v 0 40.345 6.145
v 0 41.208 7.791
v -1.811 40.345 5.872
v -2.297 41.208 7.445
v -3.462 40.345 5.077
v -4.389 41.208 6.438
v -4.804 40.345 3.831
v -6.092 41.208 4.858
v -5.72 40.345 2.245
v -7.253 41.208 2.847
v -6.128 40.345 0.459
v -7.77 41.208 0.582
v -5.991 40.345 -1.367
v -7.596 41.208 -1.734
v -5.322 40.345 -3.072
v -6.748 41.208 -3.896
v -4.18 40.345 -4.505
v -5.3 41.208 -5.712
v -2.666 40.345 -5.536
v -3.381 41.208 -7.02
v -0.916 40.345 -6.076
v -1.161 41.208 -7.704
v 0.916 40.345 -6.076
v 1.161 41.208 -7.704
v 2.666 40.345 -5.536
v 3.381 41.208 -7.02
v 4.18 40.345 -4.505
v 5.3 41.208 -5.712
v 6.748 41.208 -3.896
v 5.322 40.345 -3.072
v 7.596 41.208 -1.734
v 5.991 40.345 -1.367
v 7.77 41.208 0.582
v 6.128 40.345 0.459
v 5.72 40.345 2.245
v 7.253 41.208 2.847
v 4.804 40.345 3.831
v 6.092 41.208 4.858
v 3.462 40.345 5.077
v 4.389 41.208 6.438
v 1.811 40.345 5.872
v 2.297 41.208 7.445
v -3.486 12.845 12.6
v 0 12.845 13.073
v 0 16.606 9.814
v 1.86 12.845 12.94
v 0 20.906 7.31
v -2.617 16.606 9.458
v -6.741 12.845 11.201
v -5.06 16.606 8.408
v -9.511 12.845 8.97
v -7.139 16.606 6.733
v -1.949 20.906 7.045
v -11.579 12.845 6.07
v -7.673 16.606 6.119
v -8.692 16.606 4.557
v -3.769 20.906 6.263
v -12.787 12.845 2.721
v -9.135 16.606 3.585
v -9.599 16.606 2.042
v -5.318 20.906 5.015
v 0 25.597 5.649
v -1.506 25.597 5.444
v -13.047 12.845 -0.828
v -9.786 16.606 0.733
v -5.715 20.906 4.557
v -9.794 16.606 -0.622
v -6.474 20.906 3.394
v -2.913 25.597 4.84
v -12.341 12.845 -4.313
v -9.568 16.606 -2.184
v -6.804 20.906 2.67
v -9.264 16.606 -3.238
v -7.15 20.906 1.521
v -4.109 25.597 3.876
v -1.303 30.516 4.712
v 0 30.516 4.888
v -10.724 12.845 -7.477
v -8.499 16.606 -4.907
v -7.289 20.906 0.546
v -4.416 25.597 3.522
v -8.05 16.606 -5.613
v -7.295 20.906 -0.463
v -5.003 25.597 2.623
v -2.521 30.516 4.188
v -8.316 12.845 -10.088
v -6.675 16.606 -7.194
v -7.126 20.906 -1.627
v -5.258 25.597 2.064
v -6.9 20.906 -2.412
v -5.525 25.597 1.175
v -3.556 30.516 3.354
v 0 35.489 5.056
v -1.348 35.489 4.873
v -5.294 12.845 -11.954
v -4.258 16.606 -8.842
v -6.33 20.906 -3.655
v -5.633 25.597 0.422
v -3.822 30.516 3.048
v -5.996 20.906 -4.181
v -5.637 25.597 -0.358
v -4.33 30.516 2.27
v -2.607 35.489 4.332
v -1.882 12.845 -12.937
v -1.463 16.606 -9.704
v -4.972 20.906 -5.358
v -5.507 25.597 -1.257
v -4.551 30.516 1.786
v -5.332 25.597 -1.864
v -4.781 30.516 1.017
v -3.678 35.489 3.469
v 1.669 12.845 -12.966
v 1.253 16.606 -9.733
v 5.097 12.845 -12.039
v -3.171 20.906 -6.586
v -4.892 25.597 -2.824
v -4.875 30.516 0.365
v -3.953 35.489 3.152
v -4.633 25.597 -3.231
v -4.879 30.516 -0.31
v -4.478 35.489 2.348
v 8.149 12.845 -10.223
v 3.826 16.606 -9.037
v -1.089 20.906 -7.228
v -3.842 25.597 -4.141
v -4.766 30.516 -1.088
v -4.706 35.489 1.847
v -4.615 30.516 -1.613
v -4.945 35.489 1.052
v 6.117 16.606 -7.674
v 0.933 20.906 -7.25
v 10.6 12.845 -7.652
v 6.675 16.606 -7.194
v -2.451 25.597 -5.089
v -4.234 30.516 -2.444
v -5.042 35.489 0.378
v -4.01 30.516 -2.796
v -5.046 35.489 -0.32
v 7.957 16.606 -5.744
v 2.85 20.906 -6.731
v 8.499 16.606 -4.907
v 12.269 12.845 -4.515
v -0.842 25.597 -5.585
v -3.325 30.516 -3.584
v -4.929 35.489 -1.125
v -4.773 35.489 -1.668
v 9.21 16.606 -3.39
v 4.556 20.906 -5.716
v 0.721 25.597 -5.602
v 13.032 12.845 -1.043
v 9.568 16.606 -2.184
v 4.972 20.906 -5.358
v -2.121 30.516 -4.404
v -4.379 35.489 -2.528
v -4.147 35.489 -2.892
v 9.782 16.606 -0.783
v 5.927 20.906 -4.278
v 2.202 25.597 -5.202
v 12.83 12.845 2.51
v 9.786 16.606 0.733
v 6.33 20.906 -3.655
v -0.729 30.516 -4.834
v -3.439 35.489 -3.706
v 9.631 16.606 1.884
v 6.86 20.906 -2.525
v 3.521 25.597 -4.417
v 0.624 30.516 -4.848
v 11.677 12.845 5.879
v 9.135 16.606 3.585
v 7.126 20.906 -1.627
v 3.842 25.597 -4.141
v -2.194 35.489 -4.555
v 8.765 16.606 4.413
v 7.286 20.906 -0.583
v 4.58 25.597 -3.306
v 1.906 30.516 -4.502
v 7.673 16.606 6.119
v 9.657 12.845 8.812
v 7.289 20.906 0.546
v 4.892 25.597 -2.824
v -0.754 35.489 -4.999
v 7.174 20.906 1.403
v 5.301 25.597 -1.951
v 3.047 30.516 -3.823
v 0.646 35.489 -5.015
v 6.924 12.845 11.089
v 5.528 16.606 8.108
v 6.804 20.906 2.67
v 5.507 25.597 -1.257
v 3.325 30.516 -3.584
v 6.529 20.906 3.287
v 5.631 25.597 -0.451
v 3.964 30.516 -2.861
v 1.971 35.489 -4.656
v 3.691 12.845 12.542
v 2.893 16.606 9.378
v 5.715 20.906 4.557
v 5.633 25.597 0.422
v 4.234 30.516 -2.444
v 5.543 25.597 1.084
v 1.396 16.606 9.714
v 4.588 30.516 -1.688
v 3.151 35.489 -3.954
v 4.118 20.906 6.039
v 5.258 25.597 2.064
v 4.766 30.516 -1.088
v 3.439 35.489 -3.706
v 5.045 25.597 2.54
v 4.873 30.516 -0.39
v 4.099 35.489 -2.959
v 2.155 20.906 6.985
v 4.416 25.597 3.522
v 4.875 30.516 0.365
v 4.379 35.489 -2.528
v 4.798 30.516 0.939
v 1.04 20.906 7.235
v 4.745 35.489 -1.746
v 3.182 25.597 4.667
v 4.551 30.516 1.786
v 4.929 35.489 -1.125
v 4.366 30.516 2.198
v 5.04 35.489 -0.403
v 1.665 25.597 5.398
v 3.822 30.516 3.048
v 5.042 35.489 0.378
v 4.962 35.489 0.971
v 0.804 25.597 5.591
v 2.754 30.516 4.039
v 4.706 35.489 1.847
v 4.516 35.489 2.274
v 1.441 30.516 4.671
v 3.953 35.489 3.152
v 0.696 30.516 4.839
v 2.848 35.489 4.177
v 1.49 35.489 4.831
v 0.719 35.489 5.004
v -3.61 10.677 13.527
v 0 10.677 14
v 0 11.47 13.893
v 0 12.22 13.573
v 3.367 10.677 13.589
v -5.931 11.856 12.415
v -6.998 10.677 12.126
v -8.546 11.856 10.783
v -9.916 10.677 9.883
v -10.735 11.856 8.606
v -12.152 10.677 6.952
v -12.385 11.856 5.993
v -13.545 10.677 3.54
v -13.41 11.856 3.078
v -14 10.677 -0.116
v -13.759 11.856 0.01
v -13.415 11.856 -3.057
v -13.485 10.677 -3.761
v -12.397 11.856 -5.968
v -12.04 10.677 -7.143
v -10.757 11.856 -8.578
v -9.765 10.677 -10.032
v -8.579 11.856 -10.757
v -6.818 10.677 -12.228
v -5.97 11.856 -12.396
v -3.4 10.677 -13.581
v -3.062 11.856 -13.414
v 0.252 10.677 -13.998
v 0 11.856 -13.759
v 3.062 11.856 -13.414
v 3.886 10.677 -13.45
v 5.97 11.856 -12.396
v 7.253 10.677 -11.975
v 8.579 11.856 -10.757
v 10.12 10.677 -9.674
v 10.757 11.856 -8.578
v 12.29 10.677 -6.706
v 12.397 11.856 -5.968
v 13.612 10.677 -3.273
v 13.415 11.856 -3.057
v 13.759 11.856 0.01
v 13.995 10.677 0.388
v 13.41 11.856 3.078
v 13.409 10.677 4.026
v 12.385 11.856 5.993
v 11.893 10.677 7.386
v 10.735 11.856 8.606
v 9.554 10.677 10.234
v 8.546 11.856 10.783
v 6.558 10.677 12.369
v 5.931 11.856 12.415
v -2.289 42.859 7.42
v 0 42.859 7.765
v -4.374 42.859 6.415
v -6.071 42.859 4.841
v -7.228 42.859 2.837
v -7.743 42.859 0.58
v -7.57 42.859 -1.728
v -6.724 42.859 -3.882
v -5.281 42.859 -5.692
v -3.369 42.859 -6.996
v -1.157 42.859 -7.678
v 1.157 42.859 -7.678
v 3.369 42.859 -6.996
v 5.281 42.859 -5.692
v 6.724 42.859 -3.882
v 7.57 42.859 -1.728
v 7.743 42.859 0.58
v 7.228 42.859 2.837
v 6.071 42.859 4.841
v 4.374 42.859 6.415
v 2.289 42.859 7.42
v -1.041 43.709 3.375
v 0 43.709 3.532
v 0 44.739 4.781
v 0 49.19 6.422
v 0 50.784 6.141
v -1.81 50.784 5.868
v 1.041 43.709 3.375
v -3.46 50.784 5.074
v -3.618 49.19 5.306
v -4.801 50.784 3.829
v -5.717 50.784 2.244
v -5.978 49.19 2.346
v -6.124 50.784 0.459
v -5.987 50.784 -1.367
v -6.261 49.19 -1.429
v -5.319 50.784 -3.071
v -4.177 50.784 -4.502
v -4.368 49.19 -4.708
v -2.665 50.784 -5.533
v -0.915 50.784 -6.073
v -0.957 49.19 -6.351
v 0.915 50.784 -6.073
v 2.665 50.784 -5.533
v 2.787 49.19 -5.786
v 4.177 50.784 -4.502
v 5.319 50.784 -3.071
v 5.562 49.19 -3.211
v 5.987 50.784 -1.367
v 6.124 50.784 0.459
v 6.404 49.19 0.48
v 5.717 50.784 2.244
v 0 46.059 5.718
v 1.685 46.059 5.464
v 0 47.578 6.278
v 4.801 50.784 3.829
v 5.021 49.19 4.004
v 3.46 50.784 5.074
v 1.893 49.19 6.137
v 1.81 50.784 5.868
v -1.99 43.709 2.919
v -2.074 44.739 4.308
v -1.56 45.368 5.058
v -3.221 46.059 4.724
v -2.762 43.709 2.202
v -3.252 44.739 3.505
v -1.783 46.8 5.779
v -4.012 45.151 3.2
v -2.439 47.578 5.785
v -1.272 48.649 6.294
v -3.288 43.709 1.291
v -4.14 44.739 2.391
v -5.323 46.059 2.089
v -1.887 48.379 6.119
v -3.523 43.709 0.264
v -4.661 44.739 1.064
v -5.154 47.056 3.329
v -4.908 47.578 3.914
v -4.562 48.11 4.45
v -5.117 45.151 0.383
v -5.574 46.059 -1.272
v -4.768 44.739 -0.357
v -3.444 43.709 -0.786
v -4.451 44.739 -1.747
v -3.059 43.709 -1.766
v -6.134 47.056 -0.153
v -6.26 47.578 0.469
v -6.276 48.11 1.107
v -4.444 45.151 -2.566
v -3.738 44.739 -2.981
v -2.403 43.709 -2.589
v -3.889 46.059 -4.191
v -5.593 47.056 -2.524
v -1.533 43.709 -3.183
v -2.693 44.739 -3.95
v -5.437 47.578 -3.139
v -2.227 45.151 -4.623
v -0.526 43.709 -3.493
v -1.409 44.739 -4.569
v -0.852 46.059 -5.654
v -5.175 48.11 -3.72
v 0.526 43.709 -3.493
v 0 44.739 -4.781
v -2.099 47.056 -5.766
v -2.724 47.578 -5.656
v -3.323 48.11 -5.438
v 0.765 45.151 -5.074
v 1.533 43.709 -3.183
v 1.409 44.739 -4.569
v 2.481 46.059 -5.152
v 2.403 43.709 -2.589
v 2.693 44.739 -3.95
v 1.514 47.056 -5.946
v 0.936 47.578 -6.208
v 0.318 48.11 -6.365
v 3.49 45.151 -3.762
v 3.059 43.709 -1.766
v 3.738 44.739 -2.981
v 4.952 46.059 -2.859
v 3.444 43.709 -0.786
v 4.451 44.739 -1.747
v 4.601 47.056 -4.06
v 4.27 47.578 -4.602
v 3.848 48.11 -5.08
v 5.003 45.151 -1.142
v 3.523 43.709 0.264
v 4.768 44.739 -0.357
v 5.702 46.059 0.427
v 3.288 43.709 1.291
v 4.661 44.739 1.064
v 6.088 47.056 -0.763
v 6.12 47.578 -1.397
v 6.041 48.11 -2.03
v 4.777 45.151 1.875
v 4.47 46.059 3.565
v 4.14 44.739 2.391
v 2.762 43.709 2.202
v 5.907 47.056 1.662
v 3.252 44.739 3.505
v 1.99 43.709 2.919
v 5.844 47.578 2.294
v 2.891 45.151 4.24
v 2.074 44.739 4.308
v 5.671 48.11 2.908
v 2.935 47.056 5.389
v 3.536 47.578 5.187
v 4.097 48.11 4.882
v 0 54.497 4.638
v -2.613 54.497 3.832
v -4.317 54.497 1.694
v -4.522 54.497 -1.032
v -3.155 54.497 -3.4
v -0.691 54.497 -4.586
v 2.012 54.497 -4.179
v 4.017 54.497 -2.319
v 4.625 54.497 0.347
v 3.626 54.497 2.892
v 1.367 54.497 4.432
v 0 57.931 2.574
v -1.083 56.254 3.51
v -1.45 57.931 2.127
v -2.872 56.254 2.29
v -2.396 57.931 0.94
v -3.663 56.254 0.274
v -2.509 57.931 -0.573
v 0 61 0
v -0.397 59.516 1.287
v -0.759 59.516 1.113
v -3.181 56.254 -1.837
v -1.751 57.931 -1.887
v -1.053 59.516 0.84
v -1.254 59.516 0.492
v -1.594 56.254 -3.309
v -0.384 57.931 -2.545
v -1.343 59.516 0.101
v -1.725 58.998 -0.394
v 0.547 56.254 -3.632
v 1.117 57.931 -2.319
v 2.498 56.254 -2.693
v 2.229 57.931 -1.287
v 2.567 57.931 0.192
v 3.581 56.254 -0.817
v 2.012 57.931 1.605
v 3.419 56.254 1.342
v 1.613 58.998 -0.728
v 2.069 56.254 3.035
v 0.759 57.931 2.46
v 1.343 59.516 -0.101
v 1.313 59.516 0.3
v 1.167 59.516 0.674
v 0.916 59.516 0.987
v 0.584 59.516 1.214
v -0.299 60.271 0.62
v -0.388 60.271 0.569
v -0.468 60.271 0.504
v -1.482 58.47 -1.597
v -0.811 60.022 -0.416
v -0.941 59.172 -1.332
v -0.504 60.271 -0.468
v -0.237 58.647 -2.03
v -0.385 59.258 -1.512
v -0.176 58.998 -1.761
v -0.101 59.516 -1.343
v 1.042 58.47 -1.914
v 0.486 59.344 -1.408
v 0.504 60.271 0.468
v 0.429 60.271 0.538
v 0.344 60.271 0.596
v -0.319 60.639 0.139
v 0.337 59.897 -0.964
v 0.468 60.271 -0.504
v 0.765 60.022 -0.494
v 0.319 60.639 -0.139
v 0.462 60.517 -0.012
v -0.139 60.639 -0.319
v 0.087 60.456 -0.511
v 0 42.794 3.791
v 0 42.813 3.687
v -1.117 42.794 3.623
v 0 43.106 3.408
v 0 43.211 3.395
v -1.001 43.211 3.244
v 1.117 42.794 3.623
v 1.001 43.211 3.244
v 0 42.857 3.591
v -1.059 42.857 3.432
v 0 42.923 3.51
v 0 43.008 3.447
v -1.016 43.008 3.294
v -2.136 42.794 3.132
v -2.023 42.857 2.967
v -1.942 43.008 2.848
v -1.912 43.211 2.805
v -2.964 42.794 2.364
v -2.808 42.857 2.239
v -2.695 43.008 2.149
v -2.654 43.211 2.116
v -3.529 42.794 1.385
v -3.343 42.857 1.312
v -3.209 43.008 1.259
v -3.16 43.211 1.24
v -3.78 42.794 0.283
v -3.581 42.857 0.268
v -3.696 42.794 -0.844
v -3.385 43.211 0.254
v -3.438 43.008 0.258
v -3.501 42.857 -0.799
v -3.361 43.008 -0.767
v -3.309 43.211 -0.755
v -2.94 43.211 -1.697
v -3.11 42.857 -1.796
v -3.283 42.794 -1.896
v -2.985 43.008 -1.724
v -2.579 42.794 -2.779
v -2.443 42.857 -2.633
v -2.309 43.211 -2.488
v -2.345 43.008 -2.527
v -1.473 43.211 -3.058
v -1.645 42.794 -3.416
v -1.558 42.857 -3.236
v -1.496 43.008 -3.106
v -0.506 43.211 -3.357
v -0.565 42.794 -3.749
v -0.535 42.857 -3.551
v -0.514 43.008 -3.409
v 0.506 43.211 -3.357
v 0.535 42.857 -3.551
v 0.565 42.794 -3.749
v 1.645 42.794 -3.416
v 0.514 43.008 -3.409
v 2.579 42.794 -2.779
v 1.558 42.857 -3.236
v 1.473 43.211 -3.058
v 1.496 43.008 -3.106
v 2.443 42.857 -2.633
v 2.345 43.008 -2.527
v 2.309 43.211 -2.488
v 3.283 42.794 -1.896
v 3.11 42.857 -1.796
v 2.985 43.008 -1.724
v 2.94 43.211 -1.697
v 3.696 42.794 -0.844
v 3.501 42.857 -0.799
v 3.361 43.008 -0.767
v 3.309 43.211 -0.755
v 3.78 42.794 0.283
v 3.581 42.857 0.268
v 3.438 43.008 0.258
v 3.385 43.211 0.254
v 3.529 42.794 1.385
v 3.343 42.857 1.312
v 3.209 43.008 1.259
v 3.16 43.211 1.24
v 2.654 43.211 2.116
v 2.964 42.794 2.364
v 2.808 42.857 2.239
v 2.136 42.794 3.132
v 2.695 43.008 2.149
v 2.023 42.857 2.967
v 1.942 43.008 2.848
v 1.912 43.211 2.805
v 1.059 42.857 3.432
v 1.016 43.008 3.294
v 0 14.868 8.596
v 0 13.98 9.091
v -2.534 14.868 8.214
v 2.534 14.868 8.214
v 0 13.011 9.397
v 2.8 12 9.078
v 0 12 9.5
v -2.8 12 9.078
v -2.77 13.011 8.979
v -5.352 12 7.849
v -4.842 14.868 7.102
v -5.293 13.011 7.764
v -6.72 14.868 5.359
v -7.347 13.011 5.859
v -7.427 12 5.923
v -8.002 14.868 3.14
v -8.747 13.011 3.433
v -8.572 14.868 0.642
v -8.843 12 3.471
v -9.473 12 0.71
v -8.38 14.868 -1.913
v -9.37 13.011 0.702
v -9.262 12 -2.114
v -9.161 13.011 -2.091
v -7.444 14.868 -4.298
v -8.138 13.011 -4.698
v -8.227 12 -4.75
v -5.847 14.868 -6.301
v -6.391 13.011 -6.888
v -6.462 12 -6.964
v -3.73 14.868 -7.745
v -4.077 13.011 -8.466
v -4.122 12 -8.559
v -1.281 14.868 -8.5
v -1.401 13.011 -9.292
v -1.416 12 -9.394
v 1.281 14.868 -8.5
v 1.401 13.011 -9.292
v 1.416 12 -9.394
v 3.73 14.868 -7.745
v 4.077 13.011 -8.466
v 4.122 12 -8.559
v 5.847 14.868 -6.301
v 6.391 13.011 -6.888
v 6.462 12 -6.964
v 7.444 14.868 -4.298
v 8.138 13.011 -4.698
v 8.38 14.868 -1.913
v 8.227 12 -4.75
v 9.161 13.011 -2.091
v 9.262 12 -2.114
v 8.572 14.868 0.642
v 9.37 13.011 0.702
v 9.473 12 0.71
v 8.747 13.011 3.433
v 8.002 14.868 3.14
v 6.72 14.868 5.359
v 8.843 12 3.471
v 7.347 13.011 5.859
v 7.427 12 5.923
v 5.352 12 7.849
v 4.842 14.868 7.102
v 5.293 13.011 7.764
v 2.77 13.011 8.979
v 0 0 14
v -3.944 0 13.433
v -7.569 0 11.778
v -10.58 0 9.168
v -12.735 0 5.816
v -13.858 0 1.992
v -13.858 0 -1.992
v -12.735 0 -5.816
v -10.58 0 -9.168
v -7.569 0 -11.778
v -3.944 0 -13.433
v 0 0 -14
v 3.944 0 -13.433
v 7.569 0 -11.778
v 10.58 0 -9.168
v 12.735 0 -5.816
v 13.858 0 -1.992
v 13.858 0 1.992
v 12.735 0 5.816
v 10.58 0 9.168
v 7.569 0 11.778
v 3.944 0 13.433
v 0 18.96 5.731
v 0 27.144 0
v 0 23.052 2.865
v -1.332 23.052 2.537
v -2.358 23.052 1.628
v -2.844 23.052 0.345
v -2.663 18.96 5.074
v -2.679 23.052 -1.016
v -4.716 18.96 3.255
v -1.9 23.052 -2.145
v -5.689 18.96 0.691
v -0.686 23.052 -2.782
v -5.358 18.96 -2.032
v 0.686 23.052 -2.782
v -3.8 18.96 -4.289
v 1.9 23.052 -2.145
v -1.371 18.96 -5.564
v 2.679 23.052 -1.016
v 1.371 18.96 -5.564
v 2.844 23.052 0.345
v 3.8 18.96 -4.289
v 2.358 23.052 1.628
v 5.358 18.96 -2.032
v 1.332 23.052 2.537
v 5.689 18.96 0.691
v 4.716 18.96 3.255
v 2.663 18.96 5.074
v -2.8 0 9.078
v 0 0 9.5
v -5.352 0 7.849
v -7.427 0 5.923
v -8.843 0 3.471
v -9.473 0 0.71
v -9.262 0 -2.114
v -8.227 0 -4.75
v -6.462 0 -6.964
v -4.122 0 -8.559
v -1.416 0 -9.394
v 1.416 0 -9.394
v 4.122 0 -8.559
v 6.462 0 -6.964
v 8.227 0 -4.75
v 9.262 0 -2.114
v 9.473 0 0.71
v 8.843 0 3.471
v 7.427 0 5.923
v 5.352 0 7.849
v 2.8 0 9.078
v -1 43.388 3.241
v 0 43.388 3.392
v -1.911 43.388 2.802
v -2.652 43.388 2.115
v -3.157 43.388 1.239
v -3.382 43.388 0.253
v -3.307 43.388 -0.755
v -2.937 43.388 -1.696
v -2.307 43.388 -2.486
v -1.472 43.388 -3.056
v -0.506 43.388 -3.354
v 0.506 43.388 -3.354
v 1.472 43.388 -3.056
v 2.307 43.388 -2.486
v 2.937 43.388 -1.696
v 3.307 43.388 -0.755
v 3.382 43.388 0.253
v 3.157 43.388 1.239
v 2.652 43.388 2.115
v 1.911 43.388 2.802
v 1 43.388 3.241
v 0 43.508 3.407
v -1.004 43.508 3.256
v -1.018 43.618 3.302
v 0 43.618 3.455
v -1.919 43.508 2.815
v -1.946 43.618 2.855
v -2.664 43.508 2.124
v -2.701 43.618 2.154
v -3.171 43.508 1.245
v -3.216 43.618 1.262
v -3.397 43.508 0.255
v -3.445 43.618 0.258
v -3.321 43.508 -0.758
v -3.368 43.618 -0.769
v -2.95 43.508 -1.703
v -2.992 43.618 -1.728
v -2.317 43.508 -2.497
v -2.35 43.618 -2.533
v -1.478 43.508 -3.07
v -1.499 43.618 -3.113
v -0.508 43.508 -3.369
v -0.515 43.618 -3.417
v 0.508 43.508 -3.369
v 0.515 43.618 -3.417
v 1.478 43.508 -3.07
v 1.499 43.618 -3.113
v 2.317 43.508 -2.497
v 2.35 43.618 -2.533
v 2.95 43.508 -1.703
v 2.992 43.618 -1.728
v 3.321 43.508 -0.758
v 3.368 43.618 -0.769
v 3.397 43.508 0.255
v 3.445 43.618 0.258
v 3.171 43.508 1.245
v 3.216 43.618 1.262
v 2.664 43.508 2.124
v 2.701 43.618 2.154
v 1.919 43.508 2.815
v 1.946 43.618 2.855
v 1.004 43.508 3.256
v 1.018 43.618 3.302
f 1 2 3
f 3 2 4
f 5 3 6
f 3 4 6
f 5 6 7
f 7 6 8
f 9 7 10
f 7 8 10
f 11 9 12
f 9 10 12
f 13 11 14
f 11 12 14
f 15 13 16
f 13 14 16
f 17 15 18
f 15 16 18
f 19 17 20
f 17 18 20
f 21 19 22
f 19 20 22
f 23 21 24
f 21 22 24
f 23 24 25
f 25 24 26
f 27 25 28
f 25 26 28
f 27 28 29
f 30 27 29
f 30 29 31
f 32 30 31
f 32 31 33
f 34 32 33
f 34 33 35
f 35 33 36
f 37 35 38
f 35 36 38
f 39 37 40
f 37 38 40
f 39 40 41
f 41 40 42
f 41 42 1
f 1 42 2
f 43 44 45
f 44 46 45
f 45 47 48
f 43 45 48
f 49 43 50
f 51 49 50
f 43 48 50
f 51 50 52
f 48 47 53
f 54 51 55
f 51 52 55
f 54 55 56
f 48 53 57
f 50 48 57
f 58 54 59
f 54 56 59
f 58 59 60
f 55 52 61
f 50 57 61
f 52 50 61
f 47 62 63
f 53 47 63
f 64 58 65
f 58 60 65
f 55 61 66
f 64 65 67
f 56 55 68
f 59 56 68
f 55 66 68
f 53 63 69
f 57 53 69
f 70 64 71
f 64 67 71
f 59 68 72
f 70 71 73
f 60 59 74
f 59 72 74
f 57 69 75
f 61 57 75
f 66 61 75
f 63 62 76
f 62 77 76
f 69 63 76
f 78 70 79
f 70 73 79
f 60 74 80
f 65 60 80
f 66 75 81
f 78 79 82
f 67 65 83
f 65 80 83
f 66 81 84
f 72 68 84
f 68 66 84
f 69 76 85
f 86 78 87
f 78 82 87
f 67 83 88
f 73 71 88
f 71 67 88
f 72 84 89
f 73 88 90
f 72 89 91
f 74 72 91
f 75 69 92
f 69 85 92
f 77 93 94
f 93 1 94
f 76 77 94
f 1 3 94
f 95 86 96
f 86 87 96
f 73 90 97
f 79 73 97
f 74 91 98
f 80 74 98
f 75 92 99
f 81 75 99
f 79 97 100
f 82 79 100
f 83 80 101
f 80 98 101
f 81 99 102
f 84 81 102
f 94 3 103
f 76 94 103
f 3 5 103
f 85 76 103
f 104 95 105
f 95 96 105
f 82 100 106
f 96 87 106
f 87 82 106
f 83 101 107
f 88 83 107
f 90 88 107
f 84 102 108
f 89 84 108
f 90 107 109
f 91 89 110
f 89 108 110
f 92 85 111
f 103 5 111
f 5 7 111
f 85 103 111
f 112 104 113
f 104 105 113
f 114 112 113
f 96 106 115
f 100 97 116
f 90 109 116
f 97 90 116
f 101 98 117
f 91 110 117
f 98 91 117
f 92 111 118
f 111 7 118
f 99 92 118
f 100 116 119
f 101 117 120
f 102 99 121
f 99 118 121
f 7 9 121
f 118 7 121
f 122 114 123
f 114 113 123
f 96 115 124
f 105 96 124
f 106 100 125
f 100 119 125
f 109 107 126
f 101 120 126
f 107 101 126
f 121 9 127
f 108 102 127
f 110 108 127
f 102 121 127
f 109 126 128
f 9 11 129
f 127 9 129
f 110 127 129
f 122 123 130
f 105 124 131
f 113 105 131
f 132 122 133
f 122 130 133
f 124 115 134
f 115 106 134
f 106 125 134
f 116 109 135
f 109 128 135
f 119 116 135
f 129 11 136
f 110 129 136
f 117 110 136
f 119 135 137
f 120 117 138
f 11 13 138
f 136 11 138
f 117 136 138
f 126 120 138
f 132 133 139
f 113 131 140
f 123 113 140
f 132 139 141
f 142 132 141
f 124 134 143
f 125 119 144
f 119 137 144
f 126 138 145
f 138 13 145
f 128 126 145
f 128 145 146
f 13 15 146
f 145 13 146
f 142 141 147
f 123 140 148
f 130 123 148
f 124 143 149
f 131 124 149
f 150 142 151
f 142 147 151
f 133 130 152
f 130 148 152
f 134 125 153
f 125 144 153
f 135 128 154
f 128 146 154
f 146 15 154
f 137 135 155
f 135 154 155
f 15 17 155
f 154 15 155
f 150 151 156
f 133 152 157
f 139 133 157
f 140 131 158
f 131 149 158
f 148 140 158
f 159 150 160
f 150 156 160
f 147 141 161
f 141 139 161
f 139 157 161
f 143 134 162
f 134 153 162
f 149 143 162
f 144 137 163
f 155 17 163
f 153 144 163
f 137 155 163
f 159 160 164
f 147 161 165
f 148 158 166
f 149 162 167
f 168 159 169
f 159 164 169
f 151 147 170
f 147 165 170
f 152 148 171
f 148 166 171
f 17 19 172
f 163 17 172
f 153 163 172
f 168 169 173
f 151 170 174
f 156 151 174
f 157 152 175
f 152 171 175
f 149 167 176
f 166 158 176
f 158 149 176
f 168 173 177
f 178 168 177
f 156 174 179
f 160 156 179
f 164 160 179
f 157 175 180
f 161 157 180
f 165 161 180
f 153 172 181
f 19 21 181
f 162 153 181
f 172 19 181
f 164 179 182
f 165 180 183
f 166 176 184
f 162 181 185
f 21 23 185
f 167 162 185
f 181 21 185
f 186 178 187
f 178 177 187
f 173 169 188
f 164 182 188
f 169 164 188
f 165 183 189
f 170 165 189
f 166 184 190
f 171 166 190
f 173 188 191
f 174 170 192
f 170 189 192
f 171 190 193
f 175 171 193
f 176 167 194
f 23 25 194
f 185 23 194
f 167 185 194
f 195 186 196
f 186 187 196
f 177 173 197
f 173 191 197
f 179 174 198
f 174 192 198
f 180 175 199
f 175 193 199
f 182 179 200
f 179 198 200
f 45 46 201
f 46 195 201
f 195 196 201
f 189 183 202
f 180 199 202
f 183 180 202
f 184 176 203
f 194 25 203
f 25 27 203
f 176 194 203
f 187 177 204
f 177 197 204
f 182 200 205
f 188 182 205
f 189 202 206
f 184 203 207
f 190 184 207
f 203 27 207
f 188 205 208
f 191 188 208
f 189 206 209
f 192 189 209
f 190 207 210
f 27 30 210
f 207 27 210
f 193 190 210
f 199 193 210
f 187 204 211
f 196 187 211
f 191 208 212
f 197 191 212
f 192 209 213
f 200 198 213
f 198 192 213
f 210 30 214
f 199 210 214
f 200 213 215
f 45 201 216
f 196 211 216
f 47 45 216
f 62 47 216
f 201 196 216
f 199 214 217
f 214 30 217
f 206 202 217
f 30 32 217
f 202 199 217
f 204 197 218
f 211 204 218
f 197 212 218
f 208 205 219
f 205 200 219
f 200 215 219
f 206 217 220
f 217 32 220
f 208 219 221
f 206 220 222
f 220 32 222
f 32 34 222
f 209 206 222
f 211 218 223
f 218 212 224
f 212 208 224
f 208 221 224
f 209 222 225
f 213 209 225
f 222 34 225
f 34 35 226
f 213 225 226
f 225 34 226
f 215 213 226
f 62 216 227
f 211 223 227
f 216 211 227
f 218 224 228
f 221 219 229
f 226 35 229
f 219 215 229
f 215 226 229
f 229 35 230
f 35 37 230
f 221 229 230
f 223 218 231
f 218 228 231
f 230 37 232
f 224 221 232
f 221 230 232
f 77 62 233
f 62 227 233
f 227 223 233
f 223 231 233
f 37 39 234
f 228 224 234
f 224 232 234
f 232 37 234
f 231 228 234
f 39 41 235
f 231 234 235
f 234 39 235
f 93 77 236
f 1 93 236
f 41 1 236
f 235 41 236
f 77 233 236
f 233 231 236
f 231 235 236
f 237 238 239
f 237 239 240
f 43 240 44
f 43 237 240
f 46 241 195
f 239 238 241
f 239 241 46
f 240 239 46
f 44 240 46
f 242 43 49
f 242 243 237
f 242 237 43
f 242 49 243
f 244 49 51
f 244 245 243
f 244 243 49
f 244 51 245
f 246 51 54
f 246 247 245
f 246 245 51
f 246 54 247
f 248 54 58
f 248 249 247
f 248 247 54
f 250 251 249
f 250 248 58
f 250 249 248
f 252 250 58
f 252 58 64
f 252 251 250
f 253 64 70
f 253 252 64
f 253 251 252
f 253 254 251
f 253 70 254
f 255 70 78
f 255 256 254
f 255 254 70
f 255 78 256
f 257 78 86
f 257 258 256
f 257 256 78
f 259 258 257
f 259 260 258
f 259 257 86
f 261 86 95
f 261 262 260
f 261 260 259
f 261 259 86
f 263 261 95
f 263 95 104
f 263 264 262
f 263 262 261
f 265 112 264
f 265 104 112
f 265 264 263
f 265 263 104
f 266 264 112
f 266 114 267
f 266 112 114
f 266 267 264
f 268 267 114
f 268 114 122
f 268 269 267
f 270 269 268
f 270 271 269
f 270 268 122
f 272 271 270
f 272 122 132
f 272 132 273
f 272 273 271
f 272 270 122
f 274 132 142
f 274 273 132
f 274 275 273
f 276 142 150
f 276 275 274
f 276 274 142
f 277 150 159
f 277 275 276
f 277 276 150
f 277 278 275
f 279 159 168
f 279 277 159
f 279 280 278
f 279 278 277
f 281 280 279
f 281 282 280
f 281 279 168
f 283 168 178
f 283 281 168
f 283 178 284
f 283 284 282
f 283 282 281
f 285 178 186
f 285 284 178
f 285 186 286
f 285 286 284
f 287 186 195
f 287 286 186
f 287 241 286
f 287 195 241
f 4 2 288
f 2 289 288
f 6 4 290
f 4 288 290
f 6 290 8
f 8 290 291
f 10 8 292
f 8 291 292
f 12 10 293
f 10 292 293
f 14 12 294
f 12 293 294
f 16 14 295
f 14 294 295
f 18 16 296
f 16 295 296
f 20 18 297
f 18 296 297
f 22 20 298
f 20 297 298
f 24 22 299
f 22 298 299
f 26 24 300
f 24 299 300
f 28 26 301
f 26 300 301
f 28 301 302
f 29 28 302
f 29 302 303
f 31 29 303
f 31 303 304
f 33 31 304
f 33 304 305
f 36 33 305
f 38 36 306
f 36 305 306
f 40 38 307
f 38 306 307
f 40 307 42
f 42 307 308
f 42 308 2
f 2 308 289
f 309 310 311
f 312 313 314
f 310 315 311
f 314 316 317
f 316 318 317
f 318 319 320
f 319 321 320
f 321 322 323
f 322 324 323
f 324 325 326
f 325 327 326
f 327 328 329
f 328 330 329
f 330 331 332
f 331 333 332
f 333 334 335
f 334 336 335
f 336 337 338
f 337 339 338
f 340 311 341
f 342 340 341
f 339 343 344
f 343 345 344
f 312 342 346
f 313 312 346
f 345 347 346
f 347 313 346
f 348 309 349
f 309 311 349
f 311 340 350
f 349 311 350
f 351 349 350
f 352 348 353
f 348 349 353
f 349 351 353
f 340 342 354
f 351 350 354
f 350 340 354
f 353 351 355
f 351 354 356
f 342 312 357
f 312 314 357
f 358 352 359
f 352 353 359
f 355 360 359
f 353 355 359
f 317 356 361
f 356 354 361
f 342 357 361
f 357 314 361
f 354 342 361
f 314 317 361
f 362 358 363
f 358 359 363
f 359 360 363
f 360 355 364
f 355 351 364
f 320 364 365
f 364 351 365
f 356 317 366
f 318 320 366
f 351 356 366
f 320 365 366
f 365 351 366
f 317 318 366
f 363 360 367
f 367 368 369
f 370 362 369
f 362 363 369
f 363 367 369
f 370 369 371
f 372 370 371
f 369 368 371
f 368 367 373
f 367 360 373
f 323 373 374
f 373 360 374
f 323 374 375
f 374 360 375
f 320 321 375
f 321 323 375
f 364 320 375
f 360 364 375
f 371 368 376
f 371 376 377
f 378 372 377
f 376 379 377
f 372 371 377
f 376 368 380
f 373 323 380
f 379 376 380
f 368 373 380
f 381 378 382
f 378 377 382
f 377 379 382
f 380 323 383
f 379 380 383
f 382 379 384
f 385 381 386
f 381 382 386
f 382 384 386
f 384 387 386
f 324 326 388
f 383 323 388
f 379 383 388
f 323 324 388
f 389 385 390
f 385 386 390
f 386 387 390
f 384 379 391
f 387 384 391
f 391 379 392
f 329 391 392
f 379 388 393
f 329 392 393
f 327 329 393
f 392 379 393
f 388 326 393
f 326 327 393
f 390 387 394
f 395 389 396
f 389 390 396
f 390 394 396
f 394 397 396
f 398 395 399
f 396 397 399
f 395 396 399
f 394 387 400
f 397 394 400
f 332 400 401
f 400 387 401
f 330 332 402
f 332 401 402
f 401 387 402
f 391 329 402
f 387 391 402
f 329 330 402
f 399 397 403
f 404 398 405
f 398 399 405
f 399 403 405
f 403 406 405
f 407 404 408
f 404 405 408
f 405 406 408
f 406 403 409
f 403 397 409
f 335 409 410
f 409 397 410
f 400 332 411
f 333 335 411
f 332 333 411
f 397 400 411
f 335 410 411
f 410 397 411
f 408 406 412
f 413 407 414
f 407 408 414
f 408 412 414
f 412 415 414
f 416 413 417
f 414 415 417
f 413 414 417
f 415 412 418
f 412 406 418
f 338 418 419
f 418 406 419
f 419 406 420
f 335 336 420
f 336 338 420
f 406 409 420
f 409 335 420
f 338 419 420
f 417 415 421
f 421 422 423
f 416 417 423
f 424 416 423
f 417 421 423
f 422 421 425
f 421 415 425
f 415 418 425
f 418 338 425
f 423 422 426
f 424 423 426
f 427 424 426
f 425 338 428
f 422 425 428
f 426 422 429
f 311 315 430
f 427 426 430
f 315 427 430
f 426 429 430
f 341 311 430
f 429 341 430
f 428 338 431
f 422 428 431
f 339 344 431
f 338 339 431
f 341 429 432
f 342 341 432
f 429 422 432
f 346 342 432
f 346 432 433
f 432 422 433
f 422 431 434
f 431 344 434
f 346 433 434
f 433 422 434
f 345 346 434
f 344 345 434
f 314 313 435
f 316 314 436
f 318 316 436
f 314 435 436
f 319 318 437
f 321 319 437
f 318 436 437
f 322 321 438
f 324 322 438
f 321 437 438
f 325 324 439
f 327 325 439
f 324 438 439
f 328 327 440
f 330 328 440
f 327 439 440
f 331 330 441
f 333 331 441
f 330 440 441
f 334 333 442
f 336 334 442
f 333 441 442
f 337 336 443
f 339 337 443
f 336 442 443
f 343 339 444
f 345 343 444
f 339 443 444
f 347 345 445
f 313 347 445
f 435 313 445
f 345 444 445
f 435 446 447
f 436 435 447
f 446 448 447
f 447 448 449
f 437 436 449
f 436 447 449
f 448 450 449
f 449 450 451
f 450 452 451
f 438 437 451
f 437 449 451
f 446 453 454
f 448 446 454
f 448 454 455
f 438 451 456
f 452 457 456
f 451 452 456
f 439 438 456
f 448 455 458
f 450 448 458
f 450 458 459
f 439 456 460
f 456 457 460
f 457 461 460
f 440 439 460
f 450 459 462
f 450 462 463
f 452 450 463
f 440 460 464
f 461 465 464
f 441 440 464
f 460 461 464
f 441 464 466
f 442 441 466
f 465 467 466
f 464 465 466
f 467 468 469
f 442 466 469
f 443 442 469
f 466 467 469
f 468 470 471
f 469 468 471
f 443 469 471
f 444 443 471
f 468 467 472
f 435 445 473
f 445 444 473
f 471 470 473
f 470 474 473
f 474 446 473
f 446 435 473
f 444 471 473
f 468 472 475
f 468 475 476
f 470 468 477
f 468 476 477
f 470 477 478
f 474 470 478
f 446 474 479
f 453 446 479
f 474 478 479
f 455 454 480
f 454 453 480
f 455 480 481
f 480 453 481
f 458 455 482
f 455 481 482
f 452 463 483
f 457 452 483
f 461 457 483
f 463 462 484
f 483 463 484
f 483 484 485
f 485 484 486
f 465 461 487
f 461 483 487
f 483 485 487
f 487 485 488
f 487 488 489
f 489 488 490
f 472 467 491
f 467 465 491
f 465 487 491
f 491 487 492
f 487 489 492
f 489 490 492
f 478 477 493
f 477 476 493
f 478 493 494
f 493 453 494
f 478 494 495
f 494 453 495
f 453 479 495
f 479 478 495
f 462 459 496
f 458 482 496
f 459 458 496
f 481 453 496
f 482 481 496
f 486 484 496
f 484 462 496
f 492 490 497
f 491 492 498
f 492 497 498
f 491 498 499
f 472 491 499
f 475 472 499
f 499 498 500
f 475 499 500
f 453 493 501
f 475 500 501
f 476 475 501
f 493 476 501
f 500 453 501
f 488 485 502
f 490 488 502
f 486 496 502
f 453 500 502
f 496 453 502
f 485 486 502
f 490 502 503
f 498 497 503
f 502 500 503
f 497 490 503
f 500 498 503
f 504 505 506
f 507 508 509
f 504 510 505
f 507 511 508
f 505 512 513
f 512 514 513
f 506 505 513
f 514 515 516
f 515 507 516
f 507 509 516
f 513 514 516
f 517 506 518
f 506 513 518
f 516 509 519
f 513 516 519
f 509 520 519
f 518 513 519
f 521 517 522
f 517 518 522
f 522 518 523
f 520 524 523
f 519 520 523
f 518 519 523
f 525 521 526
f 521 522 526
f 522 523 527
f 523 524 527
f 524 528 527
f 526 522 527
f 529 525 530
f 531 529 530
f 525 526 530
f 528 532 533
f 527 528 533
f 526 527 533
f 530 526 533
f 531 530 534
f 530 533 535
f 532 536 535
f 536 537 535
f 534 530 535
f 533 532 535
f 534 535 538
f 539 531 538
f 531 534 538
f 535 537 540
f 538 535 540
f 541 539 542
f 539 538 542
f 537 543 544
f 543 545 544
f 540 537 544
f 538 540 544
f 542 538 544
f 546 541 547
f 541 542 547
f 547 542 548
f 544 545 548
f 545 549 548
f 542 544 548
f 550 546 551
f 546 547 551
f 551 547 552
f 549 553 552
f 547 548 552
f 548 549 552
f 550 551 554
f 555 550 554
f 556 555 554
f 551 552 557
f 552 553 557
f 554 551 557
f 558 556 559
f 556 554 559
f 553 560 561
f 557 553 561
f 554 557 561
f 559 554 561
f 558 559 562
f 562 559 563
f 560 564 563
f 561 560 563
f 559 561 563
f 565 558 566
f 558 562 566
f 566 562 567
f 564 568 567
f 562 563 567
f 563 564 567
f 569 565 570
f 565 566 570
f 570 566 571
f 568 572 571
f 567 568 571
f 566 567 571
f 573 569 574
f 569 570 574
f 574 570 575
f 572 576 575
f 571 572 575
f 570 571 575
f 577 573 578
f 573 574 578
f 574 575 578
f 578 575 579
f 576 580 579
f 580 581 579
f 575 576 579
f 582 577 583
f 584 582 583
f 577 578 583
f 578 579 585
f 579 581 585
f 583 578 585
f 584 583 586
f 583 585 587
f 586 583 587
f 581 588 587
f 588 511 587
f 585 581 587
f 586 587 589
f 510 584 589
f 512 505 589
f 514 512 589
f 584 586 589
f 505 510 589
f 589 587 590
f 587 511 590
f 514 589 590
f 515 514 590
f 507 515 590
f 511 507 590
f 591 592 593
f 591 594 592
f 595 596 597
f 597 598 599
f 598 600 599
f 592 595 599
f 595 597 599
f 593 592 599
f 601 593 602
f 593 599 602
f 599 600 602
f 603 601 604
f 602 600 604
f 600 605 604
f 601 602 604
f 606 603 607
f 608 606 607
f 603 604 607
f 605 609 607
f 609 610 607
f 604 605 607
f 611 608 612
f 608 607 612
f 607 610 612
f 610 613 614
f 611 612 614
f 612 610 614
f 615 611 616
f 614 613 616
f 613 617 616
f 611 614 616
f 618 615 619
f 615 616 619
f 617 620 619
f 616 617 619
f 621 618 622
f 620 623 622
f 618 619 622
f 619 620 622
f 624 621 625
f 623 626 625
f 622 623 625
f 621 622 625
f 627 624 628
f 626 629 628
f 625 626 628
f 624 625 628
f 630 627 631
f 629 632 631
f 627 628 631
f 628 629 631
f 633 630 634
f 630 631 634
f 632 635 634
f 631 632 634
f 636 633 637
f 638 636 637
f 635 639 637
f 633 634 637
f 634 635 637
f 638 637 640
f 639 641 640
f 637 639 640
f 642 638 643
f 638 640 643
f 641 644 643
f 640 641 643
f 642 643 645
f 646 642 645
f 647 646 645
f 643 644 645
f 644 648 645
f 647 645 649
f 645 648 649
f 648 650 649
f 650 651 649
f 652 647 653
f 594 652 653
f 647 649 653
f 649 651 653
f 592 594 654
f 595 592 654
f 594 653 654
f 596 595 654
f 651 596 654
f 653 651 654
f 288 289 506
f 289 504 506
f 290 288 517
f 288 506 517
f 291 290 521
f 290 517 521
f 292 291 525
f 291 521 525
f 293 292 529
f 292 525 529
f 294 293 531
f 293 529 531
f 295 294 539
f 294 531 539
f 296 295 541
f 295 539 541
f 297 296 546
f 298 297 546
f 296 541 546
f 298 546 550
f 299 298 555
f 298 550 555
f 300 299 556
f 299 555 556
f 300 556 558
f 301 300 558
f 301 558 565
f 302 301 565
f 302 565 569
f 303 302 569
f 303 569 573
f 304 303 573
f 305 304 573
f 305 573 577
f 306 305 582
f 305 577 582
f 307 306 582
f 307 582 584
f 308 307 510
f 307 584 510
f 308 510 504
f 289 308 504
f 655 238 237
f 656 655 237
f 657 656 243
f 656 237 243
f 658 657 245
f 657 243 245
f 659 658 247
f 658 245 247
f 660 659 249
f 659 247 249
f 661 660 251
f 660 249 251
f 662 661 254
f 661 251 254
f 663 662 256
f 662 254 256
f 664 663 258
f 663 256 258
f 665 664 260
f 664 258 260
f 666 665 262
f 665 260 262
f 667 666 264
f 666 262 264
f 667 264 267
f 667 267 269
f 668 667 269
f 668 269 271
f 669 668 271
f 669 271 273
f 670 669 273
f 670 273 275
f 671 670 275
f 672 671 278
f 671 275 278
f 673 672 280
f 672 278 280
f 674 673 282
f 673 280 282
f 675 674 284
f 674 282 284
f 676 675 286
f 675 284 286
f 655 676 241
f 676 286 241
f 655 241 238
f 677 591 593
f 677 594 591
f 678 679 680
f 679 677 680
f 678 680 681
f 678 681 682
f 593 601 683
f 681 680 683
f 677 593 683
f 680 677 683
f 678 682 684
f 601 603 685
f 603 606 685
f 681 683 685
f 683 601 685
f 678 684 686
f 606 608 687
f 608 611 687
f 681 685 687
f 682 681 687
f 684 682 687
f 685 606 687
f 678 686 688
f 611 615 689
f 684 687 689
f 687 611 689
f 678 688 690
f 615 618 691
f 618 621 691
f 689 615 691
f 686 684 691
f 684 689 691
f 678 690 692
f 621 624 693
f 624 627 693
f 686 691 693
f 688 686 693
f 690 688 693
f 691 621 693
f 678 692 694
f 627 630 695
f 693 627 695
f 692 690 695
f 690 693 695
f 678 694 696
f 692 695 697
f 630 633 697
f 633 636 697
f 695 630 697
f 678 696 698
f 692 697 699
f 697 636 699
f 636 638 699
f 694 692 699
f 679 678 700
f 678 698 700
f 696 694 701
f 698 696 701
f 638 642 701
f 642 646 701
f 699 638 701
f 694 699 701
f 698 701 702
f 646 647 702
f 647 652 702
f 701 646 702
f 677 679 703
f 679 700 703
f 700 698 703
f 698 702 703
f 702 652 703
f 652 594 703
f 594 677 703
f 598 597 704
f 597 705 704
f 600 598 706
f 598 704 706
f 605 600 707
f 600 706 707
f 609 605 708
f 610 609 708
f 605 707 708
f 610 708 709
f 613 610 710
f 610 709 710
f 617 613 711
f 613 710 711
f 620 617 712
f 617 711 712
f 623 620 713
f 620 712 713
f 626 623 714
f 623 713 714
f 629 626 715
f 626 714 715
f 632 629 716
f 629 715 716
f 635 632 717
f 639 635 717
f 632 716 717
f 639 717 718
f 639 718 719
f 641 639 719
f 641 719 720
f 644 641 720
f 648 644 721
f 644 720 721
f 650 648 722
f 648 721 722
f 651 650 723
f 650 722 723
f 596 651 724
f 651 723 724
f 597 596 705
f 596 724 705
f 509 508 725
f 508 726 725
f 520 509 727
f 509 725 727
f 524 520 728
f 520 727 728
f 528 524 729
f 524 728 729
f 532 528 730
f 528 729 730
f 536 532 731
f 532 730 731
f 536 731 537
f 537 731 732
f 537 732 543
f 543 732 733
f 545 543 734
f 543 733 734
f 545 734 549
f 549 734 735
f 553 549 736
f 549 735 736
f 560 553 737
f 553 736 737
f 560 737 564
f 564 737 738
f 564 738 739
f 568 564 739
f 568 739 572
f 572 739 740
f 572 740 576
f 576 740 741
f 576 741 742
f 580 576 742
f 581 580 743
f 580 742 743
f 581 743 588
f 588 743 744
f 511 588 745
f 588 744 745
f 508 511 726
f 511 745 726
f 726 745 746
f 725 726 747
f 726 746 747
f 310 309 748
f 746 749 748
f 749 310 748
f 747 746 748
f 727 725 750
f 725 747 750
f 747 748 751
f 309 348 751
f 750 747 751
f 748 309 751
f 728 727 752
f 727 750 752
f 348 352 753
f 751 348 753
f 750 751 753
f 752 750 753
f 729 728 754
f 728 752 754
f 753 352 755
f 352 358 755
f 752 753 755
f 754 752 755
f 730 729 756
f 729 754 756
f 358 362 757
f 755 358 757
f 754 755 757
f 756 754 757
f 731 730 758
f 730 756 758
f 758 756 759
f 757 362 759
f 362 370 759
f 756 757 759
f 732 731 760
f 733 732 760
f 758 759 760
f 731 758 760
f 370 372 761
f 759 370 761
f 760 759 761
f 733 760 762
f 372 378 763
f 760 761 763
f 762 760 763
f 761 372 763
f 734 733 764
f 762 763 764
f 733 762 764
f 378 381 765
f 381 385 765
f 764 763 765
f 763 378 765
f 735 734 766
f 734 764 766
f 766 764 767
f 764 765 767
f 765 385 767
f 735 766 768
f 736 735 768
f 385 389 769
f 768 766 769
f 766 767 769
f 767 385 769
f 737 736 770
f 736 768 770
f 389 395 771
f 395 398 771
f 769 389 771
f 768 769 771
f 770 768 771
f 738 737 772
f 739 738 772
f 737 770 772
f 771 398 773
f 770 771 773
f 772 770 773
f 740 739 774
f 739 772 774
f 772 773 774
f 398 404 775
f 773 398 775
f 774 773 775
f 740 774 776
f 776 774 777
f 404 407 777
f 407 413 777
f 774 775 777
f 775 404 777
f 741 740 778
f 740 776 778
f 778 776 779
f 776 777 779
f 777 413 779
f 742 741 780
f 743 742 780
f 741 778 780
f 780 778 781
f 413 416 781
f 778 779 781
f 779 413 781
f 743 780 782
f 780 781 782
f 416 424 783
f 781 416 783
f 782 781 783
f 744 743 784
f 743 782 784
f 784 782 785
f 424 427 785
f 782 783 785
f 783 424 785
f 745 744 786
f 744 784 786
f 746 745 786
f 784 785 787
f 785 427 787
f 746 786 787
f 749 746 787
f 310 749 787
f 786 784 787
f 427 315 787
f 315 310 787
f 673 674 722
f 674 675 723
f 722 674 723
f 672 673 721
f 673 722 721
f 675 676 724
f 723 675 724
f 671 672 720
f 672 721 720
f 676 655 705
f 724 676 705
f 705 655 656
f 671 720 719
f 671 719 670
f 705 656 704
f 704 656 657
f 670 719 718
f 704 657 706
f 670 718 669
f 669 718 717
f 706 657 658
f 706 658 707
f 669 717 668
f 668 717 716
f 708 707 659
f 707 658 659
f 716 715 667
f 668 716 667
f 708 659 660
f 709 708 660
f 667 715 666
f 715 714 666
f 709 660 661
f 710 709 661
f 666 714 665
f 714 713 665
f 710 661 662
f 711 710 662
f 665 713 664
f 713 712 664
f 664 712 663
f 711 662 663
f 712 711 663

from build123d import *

# Parameters (mm, degrees)
FILLET1_R = 3


with BuildPart() as part:
    # Sketch1 → Revolve1 (revolve)
    with BuildSketch(Plane.XY, mode=Mode.PRIVATE) as revolve1_sk:
        with BuildLine():
            Line((9.5, 12), (9.5, 0))
            Line((9.5, 0), (14, 0))
            Line((14, 0), (14, 12))
            ThreePointArc((14, 12), (5.808899363, 24.991123715), (6.144902799, 40.3452934))
            Line((6.144902799, 40.3452934), (7.791407098, 41.20778213))
            Line((7.791407098, 41.20778213), (7.764668615, 42.858630405))
            Line((7.764668615, 42.858630405), (3.791041614, 42.794270306))
            ThreePointArc((3.791041614, 42.794270306), (3.509684474, 42.923205602), (3.394593546, 43.210503755))
            Line((3.394593546, 43.210503755), (3.39171112, 43.388466278))
            ThreePointArc((3.39171112, 43.388466278), (3.427062825, 43.564311584), (3.532381916, 43.709498374))
            ThreePointArc((3.532381916, 43.709498374), (6.047939548, 46.800239445), (6.141308054, 50.784206425))
            ThreePointArc((6.141308054, 50.784206425), (3.673190764, 56.254323111), (0, 61))
            Line((0, 61), (0, 27.143900008))
            Line((0, 27.143900008), (8.595760221, 14.867882182))
            ThreePointArc((8.595760221, 14.867882182), (9.268584754, 13.503528998), (9.5, 12))
        make_face()
    revolve(revolve1_sk.sketch.rotate(Axis((0, 61, 0), (0, -1, 0)), 90), axis=Axis((0, 61, 0), (0, -1, 0)))

    # Fillet1
    fillet1_edges = [part.edges().sort_by_distance(p)[0] for p in [
        (0, 12, -14),
    ]]
    fillet(fillet1_edges, radius=FILLET1_R)


solid = part.part
